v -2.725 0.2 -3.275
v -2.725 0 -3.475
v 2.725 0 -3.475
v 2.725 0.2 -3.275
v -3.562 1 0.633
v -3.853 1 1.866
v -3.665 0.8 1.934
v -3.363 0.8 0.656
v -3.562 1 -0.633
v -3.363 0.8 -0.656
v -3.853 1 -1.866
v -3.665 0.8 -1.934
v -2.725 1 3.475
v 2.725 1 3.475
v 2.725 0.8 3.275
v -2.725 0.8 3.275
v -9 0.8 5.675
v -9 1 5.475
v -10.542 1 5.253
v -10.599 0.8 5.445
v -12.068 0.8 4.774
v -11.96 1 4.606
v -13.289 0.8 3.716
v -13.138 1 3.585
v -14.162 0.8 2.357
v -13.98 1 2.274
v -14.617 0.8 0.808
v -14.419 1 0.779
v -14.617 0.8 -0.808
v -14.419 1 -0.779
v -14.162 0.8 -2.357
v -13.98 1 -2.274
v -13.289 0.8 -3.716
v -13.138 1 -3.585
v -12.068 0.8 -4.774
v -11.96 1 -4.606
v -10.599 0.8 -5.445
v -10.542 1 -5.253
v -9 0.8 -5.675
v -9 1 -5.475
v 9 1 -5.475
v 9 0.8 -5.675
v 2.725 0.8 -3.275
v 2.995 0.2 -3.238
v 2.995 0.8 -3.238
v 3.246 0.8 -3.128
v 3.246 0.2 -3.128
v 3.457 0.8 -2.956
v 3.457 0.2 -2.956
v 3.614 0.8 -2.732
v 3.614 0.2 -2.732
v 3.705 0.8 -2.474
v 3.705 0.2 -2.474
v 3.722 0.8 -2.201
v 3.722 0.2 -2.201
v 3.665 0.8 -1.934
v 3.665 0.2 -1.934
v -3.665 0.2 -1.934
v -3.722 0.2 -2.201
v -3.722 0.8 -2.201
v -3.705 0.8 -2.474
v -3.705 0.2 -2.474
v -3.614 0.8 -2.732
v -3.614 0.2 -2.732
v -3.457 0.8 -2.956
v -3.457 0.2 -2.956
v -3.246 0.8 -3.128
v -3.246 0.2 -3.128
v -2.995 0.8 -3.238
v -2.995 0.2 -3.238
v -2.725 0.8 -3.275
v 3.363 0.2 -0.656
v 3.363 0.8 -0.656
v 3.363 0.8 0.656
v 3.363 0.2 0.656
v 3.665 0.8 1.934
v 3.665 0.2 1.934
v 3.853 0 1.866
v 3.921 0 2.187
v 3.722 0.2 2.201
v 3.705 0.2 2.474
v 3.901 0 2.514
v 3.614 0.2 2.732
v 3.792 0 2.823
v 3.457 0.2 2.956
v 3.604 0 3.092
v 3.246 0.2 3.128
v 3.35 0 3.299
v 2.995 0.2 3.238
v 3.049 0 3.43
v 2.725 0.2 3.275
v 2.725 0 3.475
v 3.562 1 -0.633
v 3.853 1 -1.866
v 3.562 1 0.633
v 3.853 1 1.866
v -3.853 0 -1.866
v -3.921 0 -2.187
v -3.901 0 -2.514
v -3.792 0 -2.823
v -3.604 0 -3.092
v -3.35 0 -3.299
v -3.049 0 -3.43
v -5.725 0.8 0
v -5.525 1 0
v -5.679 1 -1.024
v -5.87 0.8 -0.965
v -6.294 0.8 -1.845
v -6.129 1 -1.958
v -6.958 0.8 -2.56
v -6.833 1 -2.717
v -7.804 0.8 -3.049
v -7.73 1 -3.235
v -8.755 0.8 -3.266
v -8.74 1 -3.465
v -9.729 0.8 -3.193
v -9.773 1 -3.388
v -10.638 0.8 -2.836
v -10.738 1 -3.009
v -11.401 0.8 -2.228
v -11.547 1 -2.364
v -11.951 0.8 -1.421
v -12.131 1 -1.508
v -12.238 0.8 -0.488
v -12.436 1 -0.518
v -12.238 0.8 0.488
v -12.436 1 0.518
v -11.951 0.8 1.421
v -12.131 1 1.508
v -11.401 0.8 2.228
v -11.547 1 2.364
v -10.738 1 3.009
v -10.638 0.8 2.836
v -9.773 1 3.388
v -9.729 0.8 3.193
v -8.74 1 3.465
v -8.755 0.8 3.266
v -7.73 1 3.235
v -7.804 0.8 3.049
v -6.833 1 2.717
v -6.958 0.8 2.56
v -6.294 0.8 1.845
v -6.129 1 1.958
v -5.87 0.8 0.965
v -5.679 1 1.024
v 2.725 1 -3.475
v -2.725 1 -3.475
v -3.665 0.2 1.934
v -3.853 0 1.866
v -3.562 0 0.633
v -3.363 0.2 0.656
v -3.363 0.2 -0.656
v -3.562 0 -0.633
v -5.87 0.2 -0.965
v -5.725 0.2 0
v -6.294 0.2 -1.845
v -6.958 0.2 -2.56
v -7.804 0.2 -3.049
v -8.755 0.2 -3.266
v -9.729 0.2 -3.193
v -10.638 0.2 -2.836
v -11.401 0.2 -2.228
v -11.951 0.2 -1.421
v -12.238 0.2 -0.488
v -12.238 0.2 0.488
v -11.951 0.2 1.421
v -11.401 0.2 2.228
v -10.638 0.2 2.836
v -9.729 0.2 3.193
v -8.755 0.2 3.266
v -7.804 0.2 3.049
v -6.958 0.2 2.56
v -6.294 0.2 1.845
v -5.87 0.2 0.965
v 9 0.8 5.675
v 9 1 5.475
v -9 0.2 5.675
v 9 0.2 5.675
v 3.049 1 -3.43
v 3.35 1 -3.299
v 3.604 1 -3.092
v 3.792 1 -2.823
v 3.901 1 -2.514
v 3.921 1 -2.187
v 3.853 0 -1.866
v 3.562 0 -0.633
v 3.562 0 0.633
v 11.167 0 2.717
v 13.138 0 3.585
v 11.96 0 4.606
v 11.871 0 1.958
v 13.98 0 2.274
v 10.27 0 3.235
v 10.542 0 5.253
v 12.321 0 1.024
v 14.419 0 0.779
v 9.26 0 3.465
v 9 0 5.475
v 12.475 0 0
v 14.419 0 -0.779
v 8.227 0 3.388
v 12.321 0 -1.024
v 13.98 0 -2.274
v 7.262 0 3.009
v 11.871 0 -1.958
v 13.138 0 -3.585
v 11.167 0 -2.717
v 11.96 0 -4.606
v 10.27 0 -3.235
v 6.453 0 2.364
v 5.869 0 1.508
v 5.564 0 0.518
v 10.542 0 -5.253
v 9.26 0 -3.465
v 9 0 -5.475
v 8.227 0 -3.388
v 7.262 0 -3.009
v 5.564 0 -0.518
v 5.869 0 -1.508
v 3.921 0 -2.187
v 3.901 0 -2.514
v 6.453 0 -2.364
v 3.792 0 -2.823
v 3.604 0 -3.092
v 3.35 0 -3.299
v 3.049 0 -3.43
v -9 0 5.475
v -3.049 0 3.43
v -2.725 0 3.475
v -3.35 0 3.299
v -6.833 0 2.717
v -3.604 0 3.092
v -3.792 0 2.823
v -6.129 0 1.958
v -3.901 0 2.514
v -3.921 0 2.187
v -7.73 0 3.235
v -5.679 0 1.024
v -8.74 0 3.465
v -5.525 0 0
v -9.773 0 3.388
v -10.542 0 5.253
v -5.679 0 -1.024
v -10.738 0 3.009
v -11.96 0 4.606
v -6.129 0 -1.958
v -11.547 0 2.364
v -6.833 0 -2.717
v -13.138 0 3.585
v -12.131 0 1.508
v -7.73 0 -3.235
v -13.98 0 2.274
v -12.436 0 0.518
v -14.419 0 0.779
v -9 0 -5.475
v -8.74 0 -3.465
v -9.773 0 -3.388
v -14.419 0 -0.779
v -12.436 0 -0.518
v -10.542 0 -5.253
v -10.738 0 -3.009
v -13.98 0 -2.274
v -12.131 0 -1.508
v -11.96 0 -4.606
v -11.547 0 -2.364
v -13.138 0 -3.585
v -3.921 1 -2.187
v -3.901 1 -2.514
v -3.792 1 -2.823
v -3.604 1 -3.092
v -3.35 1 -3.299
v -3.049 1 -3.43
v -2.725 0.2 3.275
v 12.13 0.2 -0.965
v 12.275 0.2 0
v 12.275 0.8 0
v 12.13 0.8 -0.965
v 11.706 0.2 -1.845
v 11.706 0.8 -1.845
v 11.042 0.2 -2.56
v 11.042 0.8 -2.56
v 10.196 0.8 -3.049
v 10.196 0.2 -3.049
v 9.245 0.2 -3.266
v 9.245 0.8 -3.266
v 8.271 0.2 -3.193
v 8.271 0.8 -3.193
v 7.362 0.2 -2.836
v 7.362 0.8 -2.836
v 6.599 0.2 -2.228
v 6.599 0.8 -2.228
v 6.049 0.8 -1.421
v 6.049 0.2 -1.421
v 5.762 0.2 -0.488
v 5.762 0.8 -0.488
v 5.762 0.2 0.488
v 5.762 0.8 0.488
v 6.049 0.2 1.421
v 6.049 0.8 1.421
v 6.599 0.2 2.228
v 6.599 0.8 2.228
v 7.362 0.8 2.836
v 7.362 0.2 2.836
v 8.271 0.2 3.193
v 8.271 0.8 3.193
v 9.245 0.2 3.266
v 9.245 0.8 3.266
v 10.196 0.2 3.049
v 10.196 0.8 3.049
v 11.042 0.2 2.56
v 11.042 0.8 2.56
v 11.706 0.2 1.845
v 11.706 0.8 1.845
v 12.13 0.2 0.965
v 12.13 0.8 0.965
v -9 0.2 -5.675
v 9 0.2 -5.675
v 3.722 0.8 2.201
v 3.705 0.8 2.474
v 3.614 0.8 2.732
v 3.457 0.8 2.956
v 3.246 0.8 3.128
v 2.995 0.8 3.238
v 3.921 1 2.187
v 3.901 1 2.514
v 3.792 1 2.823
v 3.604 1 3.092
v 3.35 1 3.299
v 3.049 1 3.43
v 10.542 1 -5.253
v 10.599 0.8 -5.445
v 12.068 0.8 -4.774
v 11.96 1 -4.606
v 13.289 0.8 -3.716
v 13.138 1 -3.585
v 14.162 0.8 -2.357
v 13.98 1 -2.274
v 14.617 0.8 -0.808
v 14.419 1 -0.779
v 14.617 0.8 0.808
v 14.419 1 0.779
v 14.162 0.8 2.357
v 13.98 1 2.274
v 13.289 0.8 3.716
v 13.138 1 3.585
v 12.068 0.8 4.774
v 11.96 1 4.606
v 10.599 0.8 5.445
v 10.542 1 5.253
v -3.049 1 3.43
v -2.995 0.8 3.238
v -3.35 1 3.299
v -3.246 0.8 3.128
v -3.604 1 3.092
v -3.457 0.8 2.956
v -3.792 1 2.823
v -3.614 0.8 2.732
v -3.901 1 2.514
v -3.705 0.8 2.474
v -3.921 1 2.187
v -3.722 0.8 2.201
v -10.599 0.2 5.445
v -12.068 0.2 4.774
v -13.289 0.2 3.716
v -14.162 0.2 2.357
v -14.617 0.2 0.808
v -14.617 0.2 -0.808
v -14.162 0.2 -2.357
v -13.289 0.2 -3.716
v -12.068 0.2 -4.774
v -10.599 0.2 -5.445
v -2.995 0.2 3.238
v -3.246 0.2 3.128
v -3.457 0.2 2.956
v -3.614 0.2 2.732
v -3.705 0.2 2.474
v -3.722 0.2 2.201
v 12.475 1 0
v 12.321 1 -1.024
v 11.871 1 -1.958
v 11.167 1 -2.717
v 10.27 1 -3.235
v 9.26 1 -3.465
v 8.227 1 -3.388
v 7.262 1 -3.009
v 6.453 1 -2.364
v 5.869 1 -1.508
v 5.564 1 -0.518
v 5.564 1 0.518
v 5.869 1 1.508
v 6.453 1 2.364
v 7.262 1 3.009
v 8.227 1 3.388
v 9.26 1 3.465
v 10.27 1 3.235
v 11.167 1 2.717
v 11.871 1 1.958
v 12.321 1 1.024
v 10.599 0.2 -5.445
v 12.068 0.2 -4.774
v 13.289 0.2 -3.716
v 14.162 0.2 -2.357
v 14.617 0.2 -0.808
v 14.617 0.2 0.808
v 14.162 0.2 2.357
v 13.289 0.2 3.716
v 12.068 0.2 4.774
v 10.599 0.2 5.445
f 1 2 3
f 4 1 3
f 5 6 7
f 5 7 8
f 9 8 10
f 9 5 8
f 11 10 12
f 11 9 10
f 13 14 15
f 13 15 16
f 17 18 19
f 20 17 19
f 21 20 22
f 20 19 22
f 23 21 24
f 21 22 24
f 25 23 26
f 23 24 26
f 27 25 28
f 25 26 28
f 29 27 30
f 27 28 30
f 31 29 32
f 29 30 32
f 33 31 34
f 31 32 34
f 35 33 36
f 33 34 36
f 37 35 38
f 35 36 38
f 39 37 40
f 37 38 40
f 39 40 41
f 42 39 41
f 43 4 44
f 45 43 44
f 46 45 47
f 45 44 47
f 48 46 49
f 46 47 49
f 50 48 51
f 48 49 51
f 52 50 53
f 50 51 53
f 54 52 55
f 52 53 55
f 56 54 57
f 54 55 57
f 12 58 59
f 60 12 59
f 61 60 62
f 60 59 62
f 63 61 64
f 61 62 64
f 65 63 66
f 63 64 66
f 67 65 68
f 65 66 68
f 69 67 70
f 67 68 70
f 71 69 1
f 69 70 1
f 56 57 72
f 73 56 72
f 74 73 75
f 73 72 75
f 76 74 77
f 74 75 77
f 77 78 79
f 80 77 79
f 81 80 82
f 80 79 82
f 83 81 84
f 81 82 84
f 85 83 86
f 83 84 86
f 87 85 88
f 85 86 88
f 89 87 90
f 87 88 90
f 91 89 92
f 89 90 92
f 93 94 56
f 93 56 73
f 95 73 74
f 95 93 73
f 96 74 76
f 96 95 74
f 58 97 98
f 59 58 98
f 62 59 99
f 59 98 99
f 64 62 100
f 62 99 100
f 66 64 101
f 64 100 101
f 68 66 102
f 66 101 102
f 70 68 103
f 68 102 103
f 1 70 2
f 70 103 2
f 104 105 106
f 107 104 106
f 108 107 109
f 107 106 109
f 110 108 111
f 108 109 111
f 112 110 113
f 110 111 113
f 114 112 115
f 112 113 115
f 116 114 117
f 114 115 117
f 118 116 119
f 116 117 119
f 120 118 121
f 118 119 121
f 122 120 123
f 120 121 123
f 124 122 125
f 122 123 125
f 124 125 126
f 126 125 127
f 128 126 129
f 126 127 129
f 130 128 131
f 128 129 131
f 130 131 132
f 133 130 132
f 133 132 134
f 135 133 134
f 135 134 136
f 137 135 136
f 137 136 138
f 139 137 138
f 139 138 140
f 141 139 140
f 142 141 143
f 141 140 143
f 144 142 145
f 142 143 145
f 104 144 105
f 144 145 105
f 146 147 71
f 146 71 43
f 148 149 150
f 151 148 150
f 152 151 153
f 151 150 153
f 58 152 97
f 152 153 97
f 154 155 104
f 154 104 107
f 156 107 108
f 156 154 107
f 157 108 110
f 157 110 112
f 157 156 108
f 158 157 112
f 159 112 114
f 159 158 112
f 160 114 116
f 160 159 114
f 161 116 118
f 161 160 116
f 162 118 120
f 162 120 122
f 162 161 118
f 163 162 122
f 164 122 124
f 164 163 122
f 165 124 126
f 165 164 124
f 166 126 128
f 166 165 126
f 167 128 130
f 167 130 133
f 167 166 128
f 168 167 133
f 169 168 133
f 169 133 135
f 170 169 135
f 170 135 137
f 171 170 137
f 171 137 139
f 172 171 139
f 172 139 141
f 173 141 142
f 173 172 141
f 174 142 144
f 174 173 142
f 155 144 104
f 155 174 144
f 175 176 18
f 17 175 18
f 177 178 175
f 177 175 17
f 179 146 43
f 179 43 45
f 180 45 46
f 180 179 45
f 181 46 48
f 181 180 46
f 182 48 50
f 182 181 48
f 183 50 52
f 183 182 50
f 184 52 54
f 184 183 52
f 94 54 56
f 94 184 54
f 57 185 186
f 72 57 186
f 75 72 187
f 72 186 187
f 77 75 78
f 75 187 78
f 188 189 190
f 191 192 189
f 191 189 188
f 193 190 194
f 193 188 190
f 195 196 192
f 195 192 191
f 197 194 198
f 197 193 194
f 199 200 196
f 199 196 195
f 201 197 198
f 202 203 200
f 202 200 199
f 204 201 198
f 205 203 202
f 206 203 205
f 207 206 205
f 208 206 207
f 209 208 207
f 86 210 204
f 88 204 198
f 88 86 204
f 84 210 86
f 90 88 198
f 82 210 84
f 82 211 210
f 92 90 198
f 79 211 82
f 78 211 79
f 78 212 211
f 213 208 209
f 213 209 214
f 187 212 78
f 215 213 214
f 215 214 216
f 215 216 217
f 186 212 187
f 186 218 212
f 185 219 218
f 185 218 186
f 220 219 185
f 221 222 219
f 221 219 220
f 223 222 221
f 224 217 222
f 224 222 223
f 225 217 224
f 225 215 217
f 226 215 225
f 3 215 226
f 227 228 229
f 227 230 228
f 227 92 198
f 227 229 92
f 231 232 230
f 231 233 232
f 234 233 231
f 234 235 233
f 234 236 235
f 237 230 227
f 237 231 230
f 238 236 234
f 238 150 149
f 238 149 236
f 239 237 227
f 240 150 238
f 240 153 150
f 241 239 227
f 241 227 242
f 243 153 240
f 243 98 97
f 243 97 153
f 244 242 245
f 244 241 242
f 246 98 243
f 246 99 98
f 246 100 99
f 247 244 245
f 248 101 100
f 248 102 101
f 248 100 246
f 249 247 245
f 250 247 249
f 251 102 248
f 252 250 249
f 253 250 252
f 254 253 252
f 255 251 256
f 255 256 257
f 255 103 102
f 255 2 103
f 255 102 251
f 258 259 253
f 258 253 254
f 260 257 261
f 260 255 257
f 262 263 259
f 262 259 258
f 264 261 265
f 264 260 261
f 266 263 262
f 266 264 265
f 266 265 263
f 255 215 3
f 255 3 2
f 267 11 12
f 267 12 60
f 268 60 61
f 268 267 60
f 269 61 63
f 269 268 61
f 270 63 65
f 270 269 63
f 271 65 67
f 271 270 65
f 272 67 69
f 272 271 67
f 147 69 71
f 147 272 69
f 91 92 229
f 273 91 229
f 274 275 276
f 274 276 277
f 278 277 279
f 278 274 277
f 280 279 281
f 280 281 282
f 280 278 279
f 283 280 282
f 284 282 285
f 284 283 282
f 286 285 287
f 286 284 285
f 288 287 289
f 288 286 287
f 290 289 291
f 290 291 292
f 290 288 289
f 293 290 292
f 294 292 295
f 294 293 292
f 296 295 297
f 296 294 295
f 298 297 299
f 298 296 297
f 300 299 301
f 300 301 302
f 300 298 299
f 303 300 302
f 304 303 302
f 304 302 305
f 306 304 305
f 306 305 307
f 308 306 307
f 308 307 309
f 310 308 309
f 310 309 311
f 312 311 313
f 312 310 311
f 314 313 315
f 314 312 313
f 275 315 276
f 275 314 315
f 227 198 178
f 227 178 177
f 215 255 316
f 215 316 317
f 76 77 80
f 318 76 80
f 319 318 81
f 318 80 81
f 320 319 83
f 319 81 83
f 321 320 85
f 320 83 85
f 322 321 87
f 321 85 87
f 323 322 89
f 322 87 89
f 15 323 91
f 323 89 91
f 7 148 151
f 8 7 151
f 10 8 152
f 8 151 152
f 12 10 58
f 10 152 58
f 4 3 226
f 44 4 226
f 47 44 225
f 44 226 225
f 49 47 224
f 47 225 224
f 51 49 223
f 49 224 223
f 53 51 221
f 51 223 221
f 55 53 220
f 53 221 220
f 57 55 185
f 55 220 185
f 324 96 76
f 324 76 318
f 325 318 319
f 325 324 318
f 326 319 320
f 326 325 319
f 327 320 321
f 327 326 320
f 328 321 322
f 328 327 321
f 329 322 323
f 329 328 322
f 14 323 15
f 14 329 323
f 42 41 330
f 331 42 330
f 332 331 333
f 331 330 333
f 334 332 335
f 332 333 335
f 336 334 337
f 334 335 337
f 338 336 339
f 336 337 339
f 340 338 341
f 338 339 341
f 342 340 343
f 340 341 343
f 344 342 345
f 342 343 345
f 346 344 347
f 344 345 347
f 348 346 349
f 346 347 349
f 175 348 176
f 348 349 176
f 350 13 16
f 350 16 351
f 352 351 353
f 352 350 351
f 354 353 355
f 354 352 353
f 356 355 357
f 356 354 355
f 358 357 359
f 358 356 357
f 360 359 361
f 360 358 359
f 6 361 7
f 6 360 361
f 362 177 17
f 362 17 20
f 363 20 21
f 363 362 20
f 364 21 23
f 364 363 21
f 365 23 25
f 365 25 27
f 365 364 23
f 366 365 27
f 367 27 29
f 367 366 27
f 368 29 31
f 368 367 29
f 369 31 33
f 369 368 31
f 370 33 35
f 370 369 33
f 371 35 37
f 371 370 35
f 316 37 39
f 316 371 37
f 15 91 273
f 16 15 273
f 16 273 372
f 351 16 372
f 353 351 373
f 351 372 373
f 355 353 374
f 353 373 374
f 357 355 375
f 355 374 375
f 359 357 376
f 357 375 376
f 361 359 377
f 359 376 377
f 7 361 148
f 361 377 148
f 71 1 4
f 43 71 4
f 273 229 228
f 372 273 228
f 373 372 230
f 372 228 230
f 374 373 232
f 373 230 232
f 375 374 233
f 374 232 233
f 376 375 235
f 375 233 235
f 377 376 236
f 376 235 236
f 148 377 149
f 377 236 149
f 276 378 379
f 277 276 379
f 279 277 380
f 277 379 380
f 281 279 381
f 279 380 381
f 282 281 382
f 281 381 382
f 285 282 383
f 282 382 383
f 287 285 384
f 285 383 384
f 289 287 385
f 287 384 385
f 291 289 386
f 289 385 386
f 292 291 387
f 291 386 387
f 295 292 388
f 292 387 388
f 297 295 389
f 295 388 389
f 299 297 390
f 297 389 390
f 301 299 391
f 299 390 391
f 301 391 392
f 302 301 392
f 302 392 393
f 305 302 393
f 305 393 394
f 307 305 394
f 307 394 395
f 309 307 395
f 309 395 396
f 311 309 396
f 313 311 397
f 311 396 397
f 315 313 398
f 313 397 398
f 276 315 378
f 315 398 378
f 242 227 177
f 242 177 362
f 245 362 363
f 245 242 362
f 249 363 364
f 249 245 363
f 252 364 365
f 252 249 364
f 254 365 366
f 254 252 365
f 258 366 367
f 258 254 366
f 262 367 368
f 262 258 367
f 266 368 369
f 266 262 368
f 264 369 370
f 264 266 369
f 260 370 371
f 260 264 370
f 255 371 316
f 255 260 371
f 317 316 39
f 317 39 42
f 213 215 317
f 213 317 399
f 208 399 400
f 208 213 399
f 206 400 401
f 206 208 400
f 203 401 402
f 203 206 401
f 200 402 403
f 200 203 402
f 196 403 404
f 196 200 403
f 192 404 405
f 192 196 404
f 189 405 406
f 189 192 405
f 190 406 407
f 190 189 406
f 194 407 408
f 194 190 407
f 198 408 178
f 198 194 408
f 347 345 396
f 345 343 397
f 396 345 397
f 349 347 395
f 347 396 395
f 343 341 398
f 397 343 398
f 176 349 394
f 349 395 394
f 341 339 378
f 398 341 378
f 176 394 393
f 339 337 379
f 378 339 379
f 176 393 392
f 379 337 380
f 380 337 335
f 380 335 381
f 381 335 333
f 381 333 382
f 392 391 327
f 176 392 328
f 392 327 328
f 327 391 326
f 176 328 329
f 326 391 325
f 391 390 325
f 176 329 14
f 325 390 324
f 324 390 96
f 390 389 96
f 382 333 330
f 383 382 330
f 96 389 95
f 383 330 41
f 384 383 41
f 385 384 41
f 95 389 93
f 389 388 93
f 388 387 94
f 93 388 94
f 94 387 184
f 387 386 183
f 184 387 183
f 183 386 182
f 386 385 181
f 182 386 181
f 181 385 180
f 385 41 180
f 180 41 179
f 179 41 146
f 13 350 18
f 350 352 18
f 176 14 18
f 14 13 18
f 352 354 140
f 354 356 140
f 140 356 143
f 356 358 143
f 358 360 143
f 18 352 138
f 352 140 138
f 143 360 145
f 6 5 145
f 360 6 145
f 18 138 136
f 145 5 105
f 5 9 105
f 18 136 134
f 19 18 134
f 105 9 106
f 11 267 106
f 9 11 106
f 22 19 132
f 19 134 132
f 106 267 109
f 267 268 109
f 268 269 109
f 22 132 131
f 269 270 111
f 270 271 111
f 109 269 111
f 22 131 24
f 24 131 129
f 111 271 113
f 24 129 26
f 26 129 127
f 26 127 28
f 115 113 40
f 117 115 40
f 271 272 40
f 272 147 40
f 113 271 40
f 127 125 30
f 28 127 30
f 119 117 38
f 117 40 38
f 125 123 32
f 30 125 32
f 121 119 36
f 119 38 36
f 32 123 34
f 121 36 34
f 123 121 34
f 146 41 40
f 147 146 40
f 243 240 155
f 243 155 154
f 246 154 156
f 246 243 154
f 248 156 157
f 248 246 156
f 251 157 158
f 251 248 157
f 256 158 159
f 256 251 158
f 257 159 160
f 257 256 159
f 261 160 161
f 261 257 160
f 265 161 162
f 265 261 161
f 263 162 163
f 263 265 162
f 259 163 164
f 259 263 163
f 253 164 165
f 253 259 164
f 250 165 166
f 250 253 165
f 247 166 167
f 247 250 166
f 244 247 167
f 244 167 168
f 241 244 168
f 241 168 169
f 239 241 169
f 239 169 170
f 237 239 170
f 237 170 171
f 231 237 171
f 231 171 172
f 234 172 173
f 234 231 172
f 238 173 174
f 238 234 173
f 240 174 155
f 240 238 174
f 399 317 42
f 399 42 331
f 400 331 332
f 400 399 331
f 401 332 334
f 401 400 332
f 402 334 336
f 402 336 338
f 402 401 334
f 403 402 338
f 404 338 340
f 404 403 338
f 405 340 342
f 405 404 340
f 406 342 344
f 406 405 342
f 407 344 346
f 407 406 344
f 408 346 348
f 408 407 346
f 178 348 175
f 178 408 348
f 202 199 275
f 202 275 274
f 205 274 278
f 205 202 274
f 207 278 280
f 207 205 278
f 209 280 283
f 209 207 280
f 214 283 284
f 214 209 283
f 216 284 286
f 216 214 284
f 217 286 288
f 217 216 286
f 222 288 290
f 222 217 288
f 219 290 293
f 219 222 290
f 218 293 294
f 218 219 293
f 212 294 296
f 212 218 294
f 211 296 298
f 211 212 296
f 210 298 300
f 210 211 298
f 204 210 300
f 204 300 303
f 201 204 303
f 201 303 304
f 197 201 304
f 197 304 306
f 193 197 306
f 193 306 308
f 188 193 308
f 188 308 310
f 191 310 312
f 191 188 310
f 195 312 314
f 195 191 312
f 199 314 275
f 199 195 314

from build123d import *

# Parameters (mm, degrees)
SKETCH1_R           = 3.275
BOSS_EXTRUDE1_DEPTH = 1
CHAMFER1_SIZE       = 0.2


with BuildPart() as part:
    # Sketch1 → Boss-Extrude1 (new body)
    with BuildSketch(Plane(origin=(0, 0, 0), x_dir=(1, 0, 0), z_dir=(0, 1, 0))):
        with BuildLine():
            Line((-9, 5.675), (9, 5.675))
            ThreePointArc((9, 5.675), (14.675, 0), (9, -5.675))
            Line((9, -5.675), (-9, -5.675))
            ThreePointArc((-9, -5.675), (-14.675, 0), (-9, 5.675))
        make_face()
        with Locations((-9, 0)):
            Circle(SKETCH1_R, mode=Mode.SUBTRACT)
        with Locations((9, 0)):
            Circle(SKETCH1_R, mode=Mode.SUBTRACT)
        with BuildLine():
            Line((-2.724651404, 3.275), (2.724651404, 3.275))
            ThreePointArc((2.724651404, 3.275), (3.543438303, 2.849097566), (3.664778535, 1.93417603))
            ThreePointArc((3.664778535, 1.93417603), (3.325, 0), (3.664778535, -1.93417603))
            ThreePointArc((3.664778535, -1.93417603), (3.543438303, -2.849097566), (2.724651404, -3.275))
            Line((2.724651404, -3.275), (-2.724651404, -3.275))
            ThreePointArc((-2.724651404, -3.275), (-3.543438303, -2.849097566), (-3.664778535, -1.93417603))
            ThreePointArc((-3.664778535, -1.93417603), (-3.325, 0), (-3.664778535, 1.93417603))
            ThreePointArc((-3.664778535, 1.93417603), (-3.543438303, 2.849097566), (-2.724651404, 3.275))
        make_face(mode=Mode.SUBTRACT)
    extrude(amount=BOSS_EXTRUDE1_DEPTH)

    # Chamfer1
    chamfer1_edges = [part.edges().sort_by_distance(p)[0] for p in [
        (-12.275, 0, 0),
        (-12.275, 1, 0),
        (14.675, 1, 0),
        (0, 1, -5.675),
        (3.543438303, 0, -2.849097566),
        (0, 0, -3.275),
        (-3.543438303, 0, -2.849097566),
        (-3.325, 0, 0),
        (-3.543438303, 0, 2.849097566),
        (0, 0, 3.275),
        (3.543438303, 0, 2.849097566),
        (3.325, 0, 0),
        (3.543438303, 1, -2.849097566),
        (0, 1, -3.275),
        (-3.543438303, 1, -2.849097566),
        (-3.325, 1, 0),
        (-3.543438303, 1, 2.849097566),
        (0, 1, 3.275),
        (3.543438303, 1, 2.849097566),
        (3.325, 1, 0),
        (5.725, 0, 0),
        (5.725, 1, 0),
        (-14.675, 1, 0),
        (0, 0, -5.675),
        (14.675, 0, 0),
        (0, 0, 5.675),
        (-14.675, 0, 0),
        (0, 1, 5.675),
    ]]
    chamfer(chamfer1_edges, length=CHAMFER1_SIZE)


solid = part.part
